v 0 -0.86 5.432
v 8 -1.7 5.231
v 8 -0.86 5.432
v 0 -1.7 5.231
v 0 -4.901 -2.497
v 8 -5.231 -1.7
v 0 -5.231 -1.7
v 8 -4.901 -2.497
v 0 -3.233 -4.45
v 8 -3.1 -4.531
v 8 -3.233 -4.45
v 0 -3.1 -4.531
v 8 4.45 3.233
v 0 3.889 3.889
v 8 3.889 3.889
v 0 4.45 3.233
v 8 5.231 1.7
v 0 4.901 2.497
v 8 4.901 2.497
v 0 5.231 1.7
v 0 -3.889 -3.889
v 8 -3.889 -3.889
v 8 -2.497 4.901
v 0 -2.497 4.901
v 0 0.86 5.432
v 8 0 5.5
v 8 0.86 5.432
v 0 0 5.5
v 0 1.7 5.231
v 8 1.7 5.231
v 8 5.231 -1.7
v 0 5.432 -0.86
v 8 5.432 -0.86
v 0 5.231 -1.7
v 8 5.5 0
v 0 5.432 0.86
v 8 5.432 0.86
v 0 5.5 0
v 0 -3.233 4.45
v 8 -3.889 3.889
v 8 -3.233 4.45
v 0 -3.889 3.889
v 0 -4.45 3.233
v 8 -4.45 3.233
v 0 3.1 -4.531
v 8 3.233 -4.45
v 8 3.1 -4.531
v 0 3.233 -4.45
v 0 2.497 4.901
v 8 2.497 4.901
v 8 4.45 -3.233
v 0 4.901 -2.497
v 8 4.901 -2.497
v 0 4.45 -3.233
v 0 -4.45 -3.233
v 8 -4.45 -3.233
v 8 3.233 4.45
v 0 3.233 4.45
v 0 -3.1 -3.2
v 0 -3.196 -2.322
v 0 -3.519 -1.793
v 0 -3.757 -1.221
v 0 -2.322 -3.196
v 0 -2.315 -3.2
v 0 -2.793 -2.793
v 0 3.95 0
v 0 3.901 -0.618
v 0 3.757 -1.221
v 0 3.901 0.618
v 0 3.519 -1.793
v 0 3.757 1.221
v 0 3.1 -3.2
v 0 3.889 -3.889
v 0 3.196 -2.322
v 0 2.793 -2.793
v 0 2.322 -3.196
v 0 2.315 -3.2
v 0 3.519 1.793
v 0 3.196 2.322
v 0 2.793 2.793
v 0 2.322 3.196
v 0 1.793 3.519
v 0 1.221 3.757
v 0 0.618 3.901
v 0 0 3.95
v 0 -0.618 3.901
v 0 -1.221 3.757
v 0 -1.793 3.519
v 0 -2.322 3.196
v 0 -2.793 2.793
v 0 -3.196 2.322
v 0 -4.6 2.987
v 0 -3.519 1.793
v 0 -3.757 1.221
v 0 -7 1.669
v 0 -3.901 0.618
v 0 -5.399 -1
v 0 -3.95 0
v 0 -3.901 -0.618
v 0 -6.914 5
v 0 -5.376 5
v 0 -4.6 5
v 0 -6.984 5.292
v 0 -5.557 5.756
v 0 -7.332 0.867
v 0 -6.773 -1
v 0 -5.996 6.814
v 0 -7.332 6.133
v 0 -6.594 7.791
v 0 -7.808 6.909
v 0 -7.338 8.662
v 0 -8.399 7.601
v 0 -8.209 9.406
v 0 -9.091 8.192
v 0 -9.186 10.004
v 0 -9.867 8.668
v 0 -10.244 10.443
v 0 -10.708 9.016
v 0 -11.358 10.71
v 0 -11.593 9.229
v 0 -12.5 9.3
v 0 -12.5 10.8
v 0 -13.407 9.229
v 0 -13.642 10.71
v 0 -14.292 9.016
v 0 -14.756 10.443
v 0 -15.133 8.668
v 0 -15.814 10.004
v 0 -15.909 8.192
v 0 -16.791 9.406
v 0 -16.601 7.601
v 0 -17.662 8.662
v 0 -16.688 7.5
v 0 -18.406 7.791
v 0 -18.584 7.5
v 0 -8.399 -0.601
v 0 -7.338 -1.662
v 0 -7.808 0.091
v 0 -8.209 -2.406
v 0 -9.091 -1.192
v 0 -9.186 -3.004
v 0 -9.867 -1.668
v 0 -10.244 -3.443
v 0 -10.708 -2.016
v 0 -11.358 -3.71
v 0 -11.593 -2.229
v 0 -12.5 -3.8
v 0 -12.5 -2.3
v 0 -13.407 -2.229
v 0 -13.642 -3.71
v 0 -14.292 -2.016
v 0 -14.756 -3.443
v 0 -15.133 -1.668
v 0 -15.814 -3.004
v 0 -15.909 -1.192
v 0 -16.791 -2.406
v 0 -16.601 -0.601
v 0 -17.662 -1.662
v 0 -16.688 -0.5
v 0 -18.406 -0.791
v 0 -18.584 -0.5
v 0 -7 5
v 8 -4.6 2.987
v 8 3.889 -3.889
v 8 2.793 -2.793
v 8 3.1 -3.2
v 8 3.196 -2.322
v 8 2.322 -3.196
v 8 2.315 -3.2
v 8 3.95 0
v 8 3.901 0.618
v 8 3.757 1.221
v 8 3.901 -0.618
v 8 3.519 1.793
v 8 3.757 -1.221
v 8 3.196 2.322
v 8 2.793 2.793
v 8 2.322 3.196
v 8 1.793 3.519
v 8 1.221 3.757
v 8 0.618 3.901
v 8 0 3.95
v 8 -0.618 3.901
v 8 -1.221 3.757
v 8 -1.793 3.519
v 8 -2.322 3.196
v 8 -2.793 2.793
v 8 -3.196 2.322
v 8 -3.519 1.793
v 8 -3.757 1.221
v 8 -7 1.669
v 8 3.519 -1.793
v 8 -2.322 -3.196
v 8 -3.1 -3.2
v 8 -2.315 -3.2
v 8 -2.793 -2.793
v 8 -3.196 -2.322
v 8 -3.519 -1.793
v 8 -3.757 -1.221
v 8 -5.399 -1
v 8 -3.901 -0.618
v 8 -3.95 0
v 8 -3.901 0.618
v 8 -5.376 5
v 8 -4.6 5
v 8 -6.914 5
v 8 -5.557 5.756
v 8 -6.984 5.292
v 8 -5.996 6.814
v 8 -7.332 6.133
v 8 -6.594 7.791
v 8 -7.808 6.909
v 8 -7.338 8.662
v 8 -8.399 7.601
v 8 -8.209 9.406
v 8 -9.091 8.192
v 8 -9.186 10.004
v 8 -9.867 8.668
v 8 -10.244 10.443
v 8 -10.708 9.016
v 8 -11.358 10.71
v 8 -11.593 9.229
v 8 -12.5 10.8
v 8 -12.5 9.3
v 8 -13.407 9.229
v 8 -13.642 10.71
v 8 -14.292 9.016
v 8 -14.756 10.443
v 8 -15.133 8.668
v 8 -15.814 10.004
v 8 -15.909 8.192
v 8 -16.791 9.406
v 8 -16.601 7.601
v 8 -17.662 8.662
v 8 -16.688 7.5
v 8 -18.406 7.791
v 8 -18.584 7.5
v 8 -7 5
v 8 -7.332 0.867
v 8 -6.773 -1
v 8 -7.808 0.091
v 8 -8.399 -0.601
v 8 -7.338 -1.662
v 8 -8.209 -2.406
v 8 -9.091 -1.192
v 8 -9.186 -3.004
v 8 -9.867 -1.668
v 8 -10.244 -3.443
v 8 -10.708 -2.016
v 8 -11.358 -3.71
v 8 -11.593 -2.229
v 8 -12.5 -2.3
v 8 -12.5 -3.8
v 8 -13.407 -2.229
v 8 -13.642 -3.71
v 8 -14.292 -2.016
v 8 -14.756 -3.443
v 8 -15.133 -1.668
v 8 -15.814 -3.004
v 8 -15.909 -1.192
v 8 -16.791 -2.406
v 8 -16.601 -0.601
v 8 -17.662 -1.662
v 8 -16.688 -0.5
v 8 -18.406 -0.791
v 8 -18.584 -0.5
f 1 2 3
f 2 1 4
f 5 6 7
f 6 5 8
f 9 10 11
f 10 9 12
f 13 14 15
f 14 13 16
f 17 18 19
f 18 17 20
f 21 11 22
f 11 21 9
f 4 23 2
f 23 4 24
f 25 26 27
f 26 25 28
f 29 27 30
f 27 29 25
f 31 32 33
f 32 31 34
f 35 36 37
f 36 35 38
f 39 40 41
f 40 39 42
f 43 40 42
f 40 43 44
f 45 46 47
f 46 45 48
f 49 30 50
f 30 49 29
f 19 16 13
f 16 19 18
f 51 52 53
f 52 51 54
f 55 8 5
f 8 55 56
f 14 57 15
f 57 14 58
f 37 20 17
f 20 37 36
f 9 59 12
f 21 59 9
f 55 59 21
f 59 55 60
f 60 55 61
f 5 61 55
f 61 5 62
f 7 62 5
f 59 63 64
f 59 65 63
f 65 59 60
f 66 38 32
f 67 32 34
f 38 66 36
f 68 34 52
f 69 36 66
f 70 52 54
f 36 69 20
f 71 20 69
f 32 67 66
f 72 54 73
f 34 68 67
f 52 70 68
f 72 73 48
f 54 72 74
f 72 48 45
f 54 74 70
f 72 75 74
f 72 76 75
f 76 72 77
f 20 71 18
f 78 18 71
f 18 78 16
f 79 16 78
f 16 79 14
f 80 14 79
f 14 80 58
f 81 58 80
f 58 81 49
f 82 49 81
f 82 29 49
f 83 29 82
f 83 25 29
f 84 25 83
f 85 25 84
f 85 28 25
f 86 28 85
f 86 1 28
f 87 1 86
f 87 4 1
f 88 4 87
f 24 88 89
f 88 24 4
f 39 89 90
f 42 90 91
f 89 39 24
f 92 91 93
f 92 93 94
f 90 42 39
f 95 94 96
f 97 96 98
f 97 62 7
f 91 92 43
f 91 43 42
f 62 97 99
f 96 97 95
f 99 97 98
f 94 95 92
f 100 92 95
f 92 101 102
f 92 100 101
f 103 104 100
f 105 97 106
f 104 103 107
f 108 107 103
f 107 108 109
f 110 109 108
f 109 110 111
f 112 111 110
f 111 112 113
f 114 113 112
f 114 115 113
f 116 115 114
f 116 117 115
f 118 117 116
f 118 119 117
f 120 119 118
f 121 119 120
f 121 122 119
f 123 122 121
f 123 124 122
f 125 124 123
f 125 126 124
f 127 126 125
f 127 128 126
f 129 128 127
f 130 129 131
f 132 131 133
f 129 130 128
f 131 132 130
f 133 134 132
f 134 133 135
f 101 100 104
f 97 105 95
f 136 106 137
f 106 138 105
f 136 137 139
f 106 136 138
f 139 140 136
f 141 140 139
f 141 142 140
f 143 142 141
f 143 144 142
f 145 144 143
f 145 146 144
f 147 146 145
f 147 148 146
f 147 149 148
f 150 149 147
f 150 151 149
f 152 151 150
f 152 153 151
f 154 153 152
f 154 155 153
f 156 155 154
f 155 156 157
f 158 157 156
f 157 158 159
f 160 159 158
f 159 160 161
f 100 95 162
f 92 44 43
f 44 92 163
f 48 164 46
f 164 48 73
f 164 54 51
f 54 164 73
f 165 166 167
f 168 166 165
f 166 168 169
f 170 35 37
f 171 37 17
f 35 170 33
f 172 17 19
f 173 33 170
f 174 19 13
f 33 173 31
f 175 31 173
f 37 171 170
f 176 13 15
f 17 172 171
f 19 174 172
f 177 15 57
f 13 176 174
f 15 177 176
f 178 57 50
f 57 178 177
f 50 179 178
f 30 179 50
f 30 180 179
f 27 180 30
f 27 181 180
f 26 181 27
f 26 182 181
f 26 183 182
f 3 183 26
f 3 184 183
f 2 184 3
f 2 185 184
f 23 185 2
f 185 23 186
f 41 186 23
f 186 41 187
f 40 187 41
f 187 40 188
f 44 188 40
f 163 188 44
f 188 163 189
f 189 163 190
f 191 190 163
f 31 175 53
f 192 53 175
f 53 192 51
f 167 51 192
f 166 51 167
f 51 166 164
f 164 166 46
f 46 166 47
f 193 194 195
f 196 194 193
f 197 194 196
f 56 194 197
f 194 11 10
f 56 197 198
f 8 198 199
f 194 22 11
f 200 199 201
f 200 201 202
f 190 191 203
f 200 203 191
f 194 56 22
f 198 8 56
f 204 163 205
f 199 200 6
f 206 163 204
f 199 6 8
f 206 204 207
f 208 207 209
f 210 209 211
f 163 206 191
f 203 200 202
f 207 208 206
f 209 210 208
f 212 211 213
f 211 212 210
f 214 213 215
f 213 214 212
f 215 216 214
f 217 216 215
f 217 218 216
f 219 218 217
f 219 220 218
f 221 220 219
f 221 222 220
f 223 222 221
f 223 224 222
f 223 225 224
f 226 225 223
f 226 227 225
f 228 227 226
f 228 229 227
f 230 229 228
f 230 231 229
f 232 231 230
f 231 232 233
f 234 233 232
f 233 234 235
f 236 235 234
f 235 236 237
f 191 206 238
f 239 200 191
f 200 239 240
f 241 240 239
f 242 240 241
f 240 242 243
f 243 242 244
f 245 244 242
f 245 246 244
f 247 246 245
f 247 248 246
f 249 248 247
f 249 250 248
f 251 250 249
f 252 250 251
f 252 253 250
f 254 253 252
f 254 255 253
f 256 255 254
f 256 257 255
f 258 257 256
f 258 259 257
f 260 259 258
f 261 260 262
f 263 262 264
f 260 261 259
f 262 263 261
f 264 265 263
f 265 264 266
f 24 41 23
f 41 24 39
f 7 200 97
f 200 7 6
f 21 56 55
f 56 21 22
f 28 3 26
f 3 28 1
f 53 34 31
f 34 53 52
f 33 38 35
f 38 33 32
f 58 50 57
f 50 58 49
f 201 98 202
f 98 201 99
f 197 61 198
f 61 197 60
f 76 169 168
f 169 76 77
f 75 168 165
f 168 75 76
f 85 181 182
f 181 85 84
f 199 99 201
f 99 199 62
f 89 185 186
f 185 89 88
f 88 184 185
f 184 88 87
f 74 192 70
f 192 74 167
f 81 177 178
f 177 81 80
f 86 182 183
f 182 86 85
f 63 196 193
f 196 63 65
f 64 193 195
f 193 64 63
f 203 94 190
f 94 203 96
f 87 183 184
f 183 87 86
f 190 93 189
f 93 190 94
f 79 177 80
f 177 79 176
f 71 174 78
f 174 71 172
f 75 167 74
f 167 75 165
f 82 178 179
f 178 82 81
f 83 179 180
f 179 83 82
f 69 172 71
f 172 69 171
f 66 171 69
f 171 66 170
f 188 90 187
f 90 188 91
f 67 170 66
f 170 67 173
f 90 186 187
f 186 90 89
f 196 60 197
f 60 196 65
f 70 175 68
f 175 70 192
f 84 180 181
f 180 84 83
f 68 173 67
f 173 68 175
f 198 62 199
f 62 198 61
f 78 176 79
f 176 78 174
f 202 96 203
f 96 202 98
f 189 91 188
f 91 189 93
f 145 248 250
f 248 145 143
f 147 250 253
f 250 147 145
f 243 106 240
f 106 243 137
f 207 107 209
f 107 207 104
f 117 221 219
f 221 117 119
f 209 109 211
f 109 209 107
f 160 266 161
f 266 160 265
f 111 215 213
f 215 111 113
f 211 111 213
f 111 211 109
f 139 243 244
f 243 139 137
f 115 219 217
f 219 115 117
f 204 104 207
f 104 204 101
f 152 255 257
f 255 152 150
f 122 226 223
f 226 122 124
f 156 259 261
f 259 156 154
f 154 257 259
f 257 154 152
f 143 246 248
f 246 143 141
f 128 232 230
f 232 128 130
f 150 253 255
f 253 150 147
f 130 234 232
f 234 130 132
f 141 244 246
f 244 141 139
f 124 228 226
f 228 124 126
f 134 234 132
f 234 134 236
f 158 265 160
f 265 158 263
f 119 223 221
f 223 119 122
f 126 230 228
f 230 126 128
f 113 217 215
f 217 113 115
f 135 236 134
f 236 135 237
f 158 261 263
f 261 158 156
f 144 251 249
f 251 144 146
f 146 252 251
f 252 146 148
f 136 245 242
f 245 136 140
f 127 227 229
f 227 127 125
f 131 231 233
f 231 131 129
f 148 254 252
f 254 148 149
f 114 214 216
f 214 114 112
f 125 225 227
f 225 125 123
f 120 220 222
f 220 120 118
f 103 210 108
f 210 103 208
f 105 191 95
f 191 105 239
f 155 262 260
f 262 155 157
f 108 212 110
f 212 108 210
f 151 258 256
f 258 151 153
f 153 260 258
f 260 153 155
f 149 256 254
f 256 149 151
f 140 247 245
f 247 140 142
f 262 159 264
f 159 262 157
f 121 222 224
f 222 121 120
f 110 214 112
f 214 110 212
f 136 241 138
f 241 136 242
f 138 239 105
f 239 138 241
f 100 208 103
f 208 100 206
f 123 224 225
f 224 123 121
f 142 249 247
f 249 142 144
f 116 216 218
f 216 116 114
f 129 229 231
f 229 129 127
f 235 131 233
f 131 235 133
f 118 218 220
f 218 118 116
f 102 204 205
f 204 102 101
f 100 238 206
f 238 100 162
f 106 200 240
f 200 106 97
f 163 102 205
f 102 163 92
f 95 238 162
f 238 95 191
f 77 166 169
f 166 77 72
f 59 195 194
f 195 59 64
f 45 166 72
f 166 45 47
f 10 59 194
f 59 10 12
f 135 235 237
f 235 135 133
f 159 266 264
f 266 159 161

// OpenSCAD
// H16_harness_clip  (qty 6; frame: local; MJF PA12 (snap needs nylon))
// GENERATED by gen_halo_stl.py from halo_parts.py. Change numbers in halo_params.scad.
// Every dimension below is an expression of the names in halo_params.scad.
include <../halo_params.scad>

difference() {
    union() {
        rotate([0, 90, 0]) {
            difference() {
                cylinder(h = 8, r = 5.5, center = false, $fn = 40);
                translate([0, 0, -1]) {
                    cylinder(h = 10, r = 3.95, center = false, $fn = 40);
                }
            }
        }
        translate([0, -12.5, 3.5]) {
            rotate([0, 90, 0]) {
                difference() {
                    cylinder(h = 8, r = 7.3, center = false, $fn = 40);
                    translate([0, 0, -1]) {
                        cylinder(h = 10, r = 5.8, center = false, $fn = 40);
                    }
                }
            }
        }
        translate([0, -7, -1]) {
            cube([8, 2.4, 6], center = false);
        }
    }
    translate([-1, -3.1, -7]) {
        cube([10, 6.2, 3.8], center = false);
    }
    translate([-1, -24, -0.5]) {
        cube([10, 8, 8], center = false);
    }
}
